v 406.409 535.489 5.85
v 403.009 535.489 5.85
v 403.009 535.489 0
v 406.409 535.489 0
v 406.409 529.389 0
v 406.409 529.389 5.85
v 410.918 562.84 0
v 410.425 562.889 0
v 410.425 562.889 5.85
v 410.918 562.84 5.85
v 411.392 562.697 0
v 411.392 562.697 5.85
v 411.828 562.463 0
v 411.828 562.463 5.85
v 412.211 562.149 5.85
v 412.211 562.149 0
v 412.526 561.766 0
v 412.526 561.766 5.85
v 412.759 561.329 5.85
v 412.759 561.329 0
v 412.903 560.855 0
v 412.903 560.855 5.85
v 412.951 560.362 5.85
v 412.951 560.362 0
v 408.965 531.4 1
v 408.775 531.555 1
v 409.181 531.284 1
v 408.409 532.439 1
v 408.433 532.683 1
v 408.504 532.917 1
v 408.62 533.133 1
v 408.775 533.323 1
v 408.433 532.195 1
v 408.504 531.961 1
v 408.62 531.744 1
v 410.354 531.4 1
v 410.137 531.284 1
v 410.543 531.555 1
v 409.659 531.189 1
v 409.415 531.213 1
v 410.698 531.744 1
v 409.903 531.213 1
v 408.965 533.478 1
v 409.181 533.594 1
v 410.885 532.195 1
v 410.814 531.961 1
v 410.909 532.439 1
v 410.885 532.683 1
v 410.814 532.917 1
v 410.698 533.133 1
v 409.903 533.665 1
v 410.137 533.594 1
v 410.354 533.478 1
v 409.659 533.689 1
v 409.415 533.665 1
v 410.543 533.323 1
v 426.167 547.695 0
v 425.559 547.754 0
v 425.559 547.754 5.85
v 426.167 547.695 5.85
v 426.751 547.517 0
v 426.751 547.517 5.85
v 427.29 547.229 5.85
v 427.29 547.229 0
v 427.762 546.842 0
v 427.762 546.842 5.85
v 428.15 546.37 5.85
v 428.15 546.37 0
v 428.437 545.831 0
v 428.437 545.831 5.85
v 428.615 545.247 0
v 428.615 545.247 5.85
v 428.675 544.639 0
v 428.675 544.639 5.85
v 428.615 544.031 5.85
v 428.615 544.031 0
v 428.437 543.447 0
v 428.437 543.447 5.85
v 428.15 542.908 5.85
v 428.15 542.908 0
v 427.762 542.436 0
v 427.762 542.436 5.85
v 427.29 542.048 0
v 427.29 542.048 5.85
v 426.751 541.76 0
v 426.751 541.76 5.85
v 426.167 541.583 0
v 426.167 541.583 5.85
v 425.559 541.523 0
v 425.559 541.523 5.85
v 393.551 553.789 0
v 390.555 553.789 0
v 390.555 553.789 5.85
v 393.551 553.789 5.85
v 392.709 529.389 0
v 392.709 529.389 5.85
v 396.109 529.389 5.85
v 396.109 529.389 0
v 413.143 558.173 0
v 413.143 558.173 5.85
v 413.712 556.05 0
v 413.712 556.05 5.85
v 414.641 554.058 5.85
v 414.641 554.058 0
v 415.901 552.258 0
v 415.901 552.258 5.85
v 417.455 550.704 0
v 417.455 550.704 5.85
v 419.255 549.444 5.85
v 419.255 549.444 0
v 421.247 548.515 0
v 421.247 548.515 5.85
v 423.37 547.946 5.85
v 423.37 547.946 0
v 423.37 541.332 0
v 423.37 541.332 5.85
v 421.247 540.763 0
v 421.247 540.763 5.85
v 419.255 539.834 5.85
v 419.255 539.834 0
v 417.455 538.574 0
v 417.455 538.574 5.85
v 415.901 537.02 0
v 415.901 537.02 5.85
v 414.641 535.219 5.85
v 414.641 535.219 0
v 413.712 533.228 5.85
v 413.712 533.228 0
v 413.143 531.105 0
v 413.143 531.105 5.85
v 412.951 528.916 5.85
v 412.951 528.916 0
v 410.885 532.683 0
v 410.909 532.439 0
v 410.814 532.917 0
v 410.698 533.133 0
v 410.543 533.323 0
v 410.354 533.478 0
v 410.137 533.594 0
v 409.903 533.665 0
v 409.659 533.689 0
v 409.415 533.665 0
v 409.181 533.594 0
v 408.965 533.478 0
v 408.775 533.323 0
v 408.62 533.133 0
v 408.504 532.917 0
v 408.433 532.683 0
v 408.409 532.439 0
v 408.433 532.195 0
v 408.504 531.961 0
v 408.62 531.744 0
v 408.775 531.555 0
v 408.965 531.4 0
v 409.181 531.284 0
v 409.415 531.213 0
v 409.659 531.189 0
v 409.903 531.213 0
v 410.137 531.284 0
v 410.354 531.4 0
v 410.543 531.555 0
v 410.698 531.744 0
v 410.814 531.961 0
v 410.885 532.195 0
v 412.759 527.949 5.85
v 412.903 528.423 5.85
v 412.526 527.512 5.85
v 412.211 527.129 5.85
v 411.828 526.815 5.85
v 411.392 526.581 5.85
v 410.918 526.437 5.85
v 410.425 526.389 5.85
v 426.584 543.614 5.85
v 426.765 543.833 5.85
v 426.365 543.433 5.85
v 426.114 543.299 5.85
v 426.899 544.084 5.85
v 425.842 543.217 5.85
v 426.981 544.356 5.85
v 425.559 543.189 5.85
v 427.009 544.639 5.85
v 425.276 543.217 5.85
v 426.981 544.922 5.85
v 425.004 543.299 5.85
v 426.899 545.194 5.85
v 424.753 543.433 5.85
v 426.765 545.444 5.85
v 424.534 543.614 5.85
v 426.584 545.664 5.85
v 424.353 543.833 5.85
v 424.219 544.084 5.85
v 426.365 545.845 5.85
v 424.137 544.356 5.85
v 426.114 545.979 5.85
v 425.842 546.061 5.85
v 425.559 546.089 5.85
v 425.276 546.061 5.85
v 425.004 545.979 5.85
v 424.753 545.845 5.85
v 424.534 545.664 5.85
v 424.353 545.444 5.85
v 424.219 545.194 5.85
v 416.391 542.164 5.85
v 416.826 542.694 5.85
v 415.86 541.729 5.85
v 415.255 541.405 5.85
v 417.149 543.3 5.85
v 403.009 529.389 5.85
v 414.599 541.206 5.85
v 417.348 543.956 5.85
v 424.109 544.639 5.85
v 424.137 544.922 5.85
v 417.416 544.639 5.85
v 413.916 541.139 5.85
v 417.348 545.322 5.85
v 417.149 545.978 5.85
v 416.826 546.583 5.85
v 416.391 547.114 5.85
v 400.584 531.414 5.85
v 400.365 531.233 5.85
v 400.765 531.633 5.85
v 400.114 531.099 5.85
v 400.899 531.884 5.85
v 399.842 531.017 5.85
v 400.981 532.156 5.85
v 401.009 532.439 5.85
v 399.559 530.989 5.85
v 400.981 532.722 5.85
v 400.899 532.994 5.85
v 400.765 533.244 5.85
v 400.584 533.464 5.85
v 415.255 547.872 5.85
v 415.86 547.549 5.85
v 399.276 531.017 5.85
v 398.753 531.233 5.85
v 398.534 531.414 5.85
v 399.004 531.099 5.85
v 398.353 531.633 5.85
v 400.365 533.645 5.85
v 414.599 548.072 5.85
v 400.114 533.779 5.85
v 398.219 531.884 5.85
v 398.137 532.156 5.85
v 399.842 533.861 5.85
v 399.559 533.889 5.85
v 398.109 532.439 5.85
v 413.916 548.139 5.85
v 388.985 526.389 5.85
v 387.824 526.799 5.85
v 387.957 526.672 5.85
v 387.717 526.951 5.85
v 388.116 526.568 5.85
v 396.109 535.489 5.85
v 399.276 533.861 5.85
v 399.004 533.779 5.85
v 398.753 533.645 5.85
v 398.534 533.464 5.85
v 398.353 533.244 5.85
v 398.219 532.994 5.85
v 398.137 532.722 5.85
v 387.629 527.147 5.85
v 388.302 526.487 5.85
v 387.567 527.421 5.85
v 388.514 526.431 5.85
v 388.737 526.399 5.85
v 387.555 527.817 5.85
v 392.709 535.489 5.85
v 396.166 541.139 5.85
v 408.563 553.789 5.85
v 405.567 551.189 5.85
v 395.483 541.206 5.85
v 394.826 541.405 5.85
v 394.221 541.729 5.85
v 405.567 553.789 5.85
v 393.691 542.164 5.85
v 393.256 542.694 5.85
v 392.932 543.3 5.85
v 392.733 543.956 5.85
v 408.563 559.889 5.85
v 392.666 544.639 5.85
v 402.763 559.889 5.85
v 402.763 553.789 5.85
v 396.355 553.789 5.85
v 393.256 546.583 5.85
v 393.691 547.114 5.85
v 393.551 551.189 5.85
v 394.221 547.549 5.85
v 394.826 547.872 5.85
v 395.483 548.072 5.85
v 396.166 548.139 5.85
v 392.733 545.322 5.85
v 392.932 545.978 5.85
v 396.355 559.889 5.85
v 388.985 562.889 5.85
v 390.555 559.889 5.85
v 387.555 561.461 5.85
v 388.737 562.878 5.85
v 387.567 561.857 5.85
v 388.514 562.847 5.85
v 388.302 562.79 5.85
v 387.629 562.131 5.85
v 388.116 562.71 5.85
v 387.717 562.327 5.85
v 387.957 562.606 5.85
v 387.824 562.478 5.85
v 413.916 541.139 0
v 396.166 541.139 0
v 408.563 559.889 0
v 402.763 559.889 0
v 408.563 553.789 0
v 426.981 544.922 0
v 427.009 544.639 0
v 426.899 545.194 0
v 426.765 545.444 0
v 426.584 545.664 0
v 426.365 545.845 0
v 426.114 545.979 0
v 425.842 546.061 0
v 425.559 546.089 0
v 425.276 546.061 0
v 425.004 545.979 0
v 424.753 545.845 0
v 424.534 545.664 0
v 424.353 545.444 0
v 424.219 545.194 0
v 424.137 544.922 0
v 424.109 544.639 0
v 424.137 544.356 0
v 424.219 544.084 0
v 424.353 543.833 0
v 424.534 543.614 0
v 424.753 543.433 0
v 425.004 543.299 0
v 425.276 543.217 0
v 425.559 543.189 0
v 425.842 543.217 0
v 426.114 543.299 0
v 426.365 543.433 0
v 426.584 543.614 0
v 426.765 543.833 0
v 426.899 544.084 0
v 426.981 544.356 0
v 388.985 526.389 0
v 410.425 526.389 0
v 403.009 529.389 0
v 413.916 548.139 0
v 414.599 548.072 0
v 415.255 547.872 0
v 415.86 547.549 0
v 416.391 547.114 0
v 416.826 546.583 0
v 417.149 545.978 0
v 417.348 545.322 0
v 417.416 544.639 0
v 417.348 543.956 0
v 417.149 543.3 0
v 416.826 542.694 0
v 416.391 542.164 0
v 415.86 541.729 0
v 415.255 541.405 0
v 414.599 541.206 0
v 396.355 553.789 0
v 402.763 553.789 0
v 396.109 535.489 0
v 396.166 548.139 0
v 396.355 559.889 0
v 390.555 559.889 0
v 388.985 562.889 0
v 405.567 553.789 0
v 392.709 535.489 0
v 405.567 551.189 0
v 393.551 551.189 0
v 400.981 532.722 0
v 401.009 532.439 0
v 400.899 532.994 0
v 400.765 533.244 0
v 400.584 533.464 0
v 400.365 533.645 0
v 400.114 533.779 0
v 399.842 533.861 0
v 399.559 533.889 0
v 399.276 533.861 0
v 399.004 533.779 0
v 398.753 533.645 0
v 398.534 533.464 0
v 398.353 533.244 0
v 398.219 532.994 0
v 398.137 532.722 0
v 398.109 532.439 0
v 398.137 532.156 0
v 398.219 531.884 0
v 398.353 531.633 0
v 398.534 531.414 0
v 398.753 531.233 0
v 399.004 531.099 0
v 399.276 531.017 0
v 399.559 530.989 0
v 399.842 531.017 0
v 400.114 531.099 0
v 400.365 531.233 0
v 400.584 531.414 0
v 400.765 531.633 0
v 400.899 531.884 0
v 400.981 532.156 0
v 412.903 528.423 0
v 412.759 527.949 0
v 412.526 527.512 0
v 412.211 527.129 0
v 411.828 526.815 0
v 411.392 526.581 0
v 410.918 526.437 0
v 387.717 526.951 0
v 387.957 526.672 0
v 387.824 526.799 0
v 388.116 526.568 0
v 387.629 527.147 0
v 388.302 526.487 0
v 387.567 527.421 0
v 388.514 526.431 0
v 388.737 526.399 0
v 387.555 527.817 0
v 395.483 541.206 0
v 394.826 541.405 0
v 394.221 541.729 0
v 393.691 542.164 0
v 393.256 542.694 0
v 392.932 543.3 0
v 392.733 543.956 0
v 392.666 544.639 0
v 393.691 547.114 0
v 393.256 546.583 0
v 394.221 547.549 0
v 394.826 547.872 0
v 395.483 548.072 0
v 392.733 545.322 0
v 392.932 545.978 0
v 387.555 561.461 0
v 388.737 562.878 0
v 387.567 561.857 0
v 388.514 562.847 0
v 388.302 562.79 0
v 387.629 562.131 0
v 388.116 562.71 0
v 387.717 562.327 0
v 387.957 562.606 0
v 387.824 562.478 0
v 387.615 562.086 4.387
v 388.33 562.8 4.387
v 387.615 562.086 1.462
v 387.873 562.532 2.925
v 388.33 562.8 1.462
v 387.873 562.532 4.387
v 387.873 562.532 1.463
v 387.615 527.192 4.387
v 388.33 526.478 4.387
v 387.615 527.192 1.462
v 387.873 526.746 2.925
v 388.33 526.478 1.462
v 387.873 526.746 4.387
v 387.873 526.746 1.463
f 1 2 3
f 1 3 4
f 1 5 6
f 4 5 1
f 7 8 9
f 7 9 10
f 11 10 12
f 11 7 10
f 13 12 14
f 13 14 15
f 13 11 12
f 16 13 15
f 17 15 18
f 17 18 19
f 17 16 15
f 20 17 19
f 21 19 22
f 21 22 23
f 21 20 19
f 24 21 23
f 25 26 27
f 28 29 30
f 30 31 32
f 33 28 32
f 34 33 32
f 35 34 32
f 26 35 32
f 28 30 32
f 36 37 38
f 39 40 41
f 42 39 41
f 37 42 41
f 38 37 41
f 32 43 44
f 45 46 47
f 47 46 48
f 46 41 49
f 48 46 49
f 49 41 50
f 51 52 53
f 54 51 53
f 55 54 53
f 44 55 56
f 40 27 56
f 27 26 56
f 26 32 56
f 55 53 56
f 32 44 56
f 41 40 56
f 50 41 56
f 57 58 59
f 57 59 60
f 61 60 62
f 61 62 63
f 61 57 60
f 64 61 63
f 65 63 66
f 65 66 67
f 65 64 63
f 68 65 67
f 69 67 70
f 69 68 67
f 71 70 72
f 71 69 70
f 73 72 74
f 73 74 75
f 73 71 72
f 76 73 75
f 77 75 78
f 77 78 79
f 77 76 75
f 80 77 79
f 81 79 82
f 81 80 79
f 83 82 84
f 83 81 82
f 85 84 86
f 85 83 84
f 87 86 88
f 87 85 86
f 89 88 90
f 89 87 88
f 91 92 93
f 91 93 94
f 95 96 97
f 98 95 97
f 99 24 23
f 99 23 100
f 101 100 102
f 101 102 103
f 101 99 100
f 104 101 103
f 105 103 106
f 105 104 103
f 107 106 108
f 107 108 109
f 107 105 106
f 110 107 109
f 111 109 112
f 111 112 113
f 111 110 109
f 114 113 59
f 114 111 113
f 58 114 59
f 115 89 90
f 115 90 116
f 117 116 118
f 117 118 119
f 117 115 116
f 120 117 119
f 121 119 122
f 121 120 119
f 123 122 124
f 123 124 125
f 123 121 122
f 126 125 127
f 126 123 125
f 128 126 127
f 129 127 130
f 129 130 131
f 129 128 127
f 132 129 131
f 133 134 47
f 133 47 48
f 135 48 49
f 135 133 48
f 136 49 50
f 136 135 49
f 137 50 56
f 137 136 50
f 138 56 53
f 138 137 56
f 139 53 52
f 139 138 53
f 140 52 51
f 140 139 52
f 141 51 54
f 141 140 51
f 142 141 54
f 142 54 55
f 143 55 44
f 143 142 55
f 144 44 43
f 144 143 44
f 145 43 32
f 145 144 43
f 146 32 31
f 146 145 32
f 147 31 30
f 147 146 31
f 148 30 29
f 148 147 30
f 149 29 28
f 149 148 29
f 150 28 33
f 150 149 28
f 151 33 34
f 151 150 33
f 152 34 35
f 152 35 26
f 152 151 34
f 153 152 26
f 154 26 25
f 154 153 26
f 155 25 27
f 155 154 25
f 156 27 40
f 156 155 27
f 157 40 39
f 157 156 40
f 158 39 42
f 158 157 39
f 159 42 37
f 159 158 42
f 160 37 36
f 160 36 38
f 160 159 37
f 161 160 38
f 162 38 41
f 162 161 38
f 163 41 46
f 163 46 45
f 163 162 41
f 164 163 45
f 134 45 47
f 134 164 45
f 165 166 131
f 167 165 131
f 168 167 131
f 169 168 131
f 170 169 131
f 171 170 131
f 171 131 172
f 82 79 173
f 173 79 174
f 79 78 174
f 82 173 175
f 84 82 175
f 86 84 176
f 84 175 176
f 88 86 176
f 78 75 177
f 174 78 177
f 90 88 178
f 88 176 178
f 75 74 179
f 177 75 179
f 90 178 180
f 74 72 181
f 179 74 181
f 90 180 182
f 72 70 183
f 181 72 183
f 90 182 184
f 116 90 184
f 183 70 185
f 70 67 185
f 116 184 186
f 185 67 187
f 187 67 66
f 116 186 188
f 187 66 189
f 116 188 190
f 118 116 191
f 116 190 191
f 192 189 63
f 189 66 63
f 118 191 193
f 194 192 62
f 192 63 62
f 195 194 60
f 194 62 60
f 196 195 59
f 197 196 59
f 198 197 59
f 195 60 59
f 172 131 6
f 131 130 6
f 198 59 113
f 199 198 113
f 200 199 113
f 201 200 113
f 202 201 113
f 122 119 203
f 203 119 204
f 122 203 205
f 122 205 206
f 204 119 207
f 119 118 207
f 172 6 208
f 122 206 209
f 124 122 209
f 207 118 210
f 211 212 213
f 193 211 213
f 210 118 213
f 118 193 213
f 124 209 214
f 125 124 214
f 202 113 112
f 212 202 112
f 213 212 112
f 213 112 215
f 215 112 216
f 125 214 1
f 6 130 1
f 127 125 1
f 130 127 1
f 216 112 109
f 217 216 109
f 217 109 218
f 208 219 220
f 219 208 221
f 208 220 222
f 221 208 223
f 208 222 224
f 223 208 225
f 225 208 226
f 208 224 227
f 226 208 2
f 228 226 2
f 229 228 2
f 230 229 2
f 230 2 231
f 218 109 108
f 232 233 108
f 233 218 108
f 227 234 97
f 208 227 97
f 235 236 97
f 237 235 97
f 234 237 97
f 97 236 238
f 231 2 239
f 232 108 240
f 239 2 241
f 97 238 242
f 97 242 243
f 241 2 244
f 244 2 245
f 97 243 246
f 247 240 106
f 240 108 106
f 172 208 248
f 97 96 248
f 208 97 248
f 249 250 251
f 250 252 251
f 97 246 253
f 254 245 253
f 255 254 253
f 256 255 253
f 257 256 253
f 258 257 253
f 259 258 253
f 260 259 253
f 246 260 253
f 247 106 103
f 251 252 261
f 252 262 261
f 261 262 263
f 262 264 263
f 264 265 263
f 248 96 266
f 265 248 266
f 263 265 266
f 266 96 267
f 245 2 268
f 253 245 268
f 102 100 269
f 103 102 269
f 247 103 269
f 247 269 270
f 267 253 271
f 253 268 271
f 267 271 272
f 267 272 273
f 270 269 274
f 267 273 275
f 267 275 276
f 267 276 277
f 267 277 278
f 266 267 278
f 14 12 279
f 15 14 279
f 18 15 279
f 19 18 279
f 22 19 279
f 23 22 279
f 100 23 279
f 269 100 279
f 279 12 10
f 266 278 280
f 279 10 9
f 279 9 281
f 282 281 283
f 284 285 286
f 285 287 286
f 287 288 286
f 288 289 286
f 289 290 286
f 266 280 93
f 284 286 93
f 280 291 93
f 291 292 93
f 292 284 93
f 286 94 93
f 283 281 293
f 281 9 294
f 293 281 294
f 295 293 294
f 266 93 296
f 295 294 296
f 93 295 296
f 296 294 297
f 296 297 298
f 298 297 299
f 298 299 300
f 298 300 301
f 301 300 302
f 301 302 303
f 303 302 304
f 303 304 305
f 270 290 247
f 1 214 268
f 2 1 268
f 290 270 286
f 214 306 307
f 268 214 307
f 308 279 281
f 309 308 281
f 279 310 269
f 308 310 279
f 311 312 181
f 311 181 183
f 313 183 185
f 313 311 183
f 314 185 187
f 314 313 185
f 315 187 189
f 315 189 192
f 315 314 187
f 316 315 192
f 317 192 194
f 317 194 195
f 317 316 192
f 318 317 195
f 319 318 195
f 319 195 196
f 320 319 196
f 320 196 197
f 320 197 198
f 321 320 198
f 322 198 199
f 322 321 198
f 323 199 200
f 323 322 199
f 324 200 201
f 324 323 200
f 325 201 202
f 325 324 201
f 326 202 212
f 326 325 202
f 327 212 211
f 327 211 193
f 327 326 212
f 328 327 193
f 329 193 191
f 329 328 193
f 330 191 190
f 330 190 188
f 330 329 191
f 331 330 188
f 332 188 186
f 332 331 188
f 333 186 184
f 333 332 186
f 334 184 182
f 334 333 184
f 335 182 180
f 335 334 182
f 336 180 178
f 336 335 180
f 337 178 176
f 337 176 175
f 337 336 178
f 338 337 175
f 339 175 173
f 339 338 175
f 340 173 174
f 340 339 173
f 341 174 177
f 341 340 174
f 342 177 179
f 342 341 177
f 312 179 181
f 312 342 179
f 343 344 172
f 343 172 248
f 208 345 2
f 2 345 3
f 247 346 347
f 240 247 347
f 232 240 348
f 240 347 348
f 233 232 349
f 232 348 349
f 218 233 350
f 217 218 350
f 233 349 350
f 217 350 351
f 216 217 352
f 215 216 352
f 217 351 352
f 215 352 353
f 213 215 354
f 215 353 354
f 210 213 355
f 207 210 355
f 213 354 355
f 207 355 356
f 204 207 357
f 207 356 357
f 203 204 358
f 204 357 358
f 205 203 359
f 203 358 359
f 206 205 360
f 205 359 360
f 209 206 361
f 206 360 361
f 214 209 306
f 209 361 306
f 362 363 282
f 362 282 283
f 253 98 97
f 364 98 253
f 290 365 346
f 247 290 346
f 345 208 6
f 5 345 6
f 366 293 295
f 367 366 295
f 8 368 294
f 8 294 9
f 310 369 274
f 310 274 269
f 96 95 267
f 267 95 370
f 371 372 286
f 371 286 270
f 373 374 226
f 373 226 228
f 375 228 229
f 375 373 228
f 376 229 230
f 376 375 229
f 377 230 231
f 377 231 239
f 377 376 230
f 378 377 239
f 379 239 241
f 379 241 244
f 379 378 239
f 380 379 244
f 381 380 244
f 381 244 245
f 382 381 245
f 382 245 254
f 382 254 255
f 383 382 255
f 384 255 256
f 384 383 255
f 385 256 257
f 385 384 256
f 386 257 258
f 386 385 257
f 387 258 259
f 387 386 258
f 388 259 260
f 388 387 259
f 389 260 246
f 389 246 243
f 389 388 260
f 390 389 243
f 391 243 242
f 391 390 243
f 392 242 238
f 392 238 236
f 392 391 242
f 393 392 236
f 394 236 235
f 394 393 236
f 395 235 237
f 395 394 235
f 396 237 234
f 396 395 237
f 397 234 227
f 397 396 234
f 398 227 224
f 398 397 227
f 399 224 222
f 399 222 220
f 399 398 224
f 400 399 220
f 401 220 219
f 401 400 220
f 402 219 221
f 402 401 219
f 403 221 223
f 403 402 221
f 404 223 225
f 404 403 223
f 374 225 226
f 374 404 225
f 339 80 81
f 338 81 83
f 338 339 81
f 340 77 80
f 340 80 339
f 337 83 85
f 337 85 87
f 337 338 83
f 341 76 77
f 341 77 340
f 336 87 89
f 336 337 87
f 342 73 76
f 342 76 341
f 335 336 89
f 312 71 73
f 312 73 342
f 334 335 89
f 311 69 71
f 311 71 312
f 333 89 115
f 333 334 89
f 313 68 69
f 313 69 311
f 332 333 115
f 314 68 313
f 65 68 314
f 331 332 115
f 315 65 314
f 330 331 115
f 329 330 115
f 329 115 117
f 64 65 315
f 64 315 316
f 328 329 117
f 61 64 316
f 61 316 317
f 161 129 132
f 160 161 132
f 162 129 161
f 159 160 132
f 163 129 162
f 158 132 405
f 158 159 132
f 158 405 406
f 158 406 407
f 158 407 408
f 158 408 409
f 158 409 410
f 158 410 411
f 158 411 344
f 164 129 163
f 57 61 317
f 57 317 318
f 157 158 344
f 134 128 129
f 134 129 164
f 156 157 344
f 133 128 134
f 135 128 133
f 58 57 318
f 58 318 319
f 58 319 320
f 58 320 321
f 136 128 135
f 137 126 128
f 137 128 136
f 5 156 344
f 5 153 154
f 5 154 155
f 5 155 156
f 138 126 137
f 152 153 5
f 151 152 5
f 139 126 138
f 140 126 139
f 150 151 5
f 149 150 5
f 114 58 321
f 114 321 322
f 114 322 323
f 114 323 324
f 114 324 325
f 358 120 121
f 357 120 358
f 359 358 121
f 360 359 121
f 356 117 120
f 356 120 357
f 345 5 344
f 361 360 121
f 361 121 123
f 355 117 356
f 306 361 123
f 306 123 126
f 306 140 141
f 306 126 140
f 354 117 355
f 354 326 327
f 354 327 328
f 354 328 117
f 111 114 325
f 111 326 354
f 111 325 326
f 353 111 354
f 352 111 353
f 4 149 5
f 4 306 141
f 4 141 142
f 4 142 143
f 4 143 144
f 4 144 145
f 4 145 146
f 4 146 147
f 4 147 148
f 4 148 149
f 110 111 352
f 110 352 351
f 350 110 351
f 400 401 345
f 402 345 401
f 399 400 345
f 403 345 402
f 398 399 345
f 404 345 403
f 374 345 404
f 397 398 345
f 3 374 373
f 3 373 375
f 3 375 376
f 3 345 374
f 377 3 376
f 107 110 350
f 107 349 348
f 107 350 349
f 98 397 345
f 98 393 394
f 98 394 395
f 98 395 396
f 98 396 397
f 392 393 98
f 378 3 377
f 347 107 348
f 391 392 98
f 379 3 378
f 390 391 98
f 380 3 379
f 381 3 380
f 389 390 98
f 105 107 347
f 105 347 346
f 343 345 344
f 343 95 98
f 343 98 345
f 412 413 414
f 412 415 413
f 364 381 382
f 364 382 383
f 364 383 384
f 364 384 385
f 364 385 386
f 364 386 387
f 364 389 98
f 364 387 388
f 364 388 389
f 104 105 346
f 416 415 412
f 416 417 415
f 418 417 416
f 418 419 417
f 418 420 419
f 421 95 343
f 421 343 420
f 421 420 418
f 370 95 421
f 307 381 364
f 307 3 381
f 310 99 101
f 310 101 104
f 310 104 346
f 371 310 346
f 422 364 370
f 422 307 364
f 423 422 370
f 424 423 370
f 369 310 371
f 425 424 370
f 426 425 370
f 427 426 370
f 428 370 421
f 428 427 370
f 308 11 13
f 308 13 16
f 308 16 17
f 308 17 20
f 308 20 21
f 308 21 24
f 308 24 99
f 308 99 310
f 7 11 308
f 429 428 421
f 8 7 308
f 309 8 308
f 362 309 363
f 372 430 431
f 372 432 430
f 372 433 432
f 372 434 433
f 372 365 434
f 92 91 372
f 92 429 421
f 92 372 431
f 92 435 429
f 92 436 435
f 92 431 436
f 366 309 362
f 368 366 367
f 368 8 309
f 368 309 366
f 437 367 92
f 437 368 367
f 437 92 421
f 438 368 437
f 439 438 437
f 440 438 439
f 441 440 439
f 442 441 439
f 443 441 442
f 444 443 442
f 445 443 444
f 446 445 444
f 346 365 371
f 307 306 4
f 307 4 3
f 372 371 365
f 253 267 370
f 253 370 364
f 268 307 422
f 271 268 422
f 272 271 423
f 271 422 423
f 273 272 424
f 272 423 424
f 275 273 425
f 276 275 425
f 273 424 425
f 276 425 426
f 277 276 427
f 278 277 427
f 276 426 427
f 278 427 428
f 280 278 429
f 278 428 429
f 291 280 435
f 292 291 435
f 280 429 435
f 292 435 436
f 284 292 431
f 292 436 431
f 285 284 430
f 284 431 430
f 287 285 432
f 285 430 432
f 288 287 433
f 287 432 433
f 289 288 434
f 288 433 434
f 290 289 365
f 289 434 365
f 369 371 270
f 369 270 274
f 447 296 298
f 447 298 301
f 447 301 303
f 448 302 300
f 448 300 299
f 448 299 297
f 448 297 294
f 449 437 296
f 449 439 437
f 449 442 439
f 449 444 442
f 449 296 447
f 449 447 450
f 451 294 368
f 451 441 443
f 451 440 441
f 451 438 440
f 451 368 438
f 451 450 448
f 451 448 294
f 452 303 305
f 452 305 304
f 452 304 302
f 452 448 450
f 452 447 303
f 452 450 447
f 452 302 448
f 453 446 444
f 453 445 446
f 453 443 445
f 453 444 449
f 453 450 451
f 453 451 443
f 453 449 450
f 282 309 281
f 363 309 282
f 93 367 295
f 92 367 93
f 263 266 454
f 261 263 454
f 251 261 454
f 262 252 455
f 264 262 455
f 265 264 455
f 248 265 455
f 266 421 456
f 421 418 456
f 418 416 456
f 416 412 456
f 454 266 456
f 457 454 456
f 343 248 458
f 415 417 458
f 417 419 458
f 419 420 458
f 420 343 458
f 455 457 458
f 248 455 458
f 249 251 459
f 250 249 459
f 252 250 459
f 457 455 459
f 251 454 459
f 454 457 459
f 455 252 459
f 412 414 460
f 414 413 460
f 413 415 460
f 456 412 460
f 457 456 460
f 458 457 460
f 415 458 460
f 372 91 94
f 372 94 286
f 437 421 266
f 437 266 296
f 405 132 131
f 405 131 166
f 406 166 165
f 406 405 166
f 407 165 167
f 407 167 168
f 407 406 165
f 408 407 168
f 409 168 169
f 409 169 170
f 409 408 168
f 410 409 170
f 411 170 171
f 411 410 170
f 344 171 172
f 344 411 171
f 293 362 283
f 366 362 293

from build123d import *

# Parameters (mm, degrees)
SKETCH1_R           = 1.45
SKETCH1_W           = 3.400011
SKETCH1_H           = 6.1
BOSS_EXTRUDE2_DEPTH = 5.85
SKETCH2_R           = 1.25
CUT_EXTRUDE1_DEPTH  = 1


with BuildPart() as part:
    # Sketch1 → Boss-Extrude2 (new body)
    with BuildSketch(Plane.XY):
        with BuildLine():
            Line((388.984643017, 562.888903138), (410.424633118, 562.888903138))
            ThreePointArc((410.424633118, 562.888903138), (412.211329852, 562.148829119), (412.95140387, 560.362132386))
            ThreePointArc((412.95140387, 560.362132386), (416.644097047, 551.447182437), (425.559046996, 547.75448926))
            ThreePointArc((425.559046996, 547.75448926), (428.674633119, 544.638903138), (425.559046996, 541.523317015))
            ThreePointArc((425.559046996, 541.523317015), (416.644097047, 537.830623838), (412.95140387, 528.915673889))
            ThreePointArc((412.95140387, 528.915673889), (412.211329852, 527.128977156), (410.424633118, 526.388903138))
            Line((410.424633118, 526.388903138), (388.984643017, 526.388903138))
            add(Edge.make_bspline(
                [(387.555122745, 527.816961526), (387.476445389, 526.388903138), (388.984643017, 526.388903138)],
                knots=[0, 0, 0, 1, 1, 1], degree=2))
            Line((387.555122745, 527.816961526), (387.555122745, 561.460844041))
            add(Edge.make_bspline(
                [(387.555122745, 561.460844041), (387.476444597, 562.888903138), (388.984643017, 562.888903138)],
                knots=[0, 0, 0, 1, 1, 1], degree=2))
        make_face()
        with Locations((425.559046996, 544.638903138)):
            Circle(SKETCH1_R, mode=Mode.SUBTRACT)
        with Locations((399.559046996, 532.438903138)):
            Circle(SKETCH1_R, mode=Mode.SUBTRACT)
        Polygon((405.566920996, 551.188903138), (405.566920996, 553.788903138), (408.562971247, 553.788903138), (408.562971247, 559.888903138), (402.762971247, 559.888903138), (402.762971247, 553.788903138), (396.355122745, 553.788903138), (396.355122745, 559.888903138), (390.555122745, 559.888903138), (390.555122745, 553.788903138), (393.551172996, 553.788903138), (393.551172996, 551.188903138), align=None, mode=Mode.SUBTRACT)
        with Locations((394.409041496, 532.438903138)):
            Rectangle(SKETCH1_W, SKETCH1_H, mode=Mode.SUBTRACT)
        with Locations((404.709052496, 532.438903138)):
            Rectangle(SKETCH1_W, SKETCH1_H, mode=Mode.SUBTRACT)
        with BuildLine():
            Line((396.165690223, 548.138903138), (413.915690223, 548.138903138))
            ThreePointArc((413.915690223, 548.138903138), (417.415690223, 544.638903138), (413.915690223, 541.138903138))
            Line((413.915690223, 541.138903138), (396.165690223, 541.138903138))
            ThreePointArc((396.165690223, 541.138903138), (392.665690223, 544.638903138), (396.165690223, 548.138903138))
        make_face(mode=Mode.SUBTRACT)
    extrude(amount=BOSS_EXTRUDE2_DEPTH)

    # Sketch2 → Cut-Extrude1 (cut)
    with BuildSketch(Plane.XY):
        with Locations((409.659057996, 532.438903138)):
            Circle(SKETCH2_R)
    extrude(amount=CUT_EXTRUDE1_DEPTH, mode=Mode.SUBTRACT)


solid = part.part
